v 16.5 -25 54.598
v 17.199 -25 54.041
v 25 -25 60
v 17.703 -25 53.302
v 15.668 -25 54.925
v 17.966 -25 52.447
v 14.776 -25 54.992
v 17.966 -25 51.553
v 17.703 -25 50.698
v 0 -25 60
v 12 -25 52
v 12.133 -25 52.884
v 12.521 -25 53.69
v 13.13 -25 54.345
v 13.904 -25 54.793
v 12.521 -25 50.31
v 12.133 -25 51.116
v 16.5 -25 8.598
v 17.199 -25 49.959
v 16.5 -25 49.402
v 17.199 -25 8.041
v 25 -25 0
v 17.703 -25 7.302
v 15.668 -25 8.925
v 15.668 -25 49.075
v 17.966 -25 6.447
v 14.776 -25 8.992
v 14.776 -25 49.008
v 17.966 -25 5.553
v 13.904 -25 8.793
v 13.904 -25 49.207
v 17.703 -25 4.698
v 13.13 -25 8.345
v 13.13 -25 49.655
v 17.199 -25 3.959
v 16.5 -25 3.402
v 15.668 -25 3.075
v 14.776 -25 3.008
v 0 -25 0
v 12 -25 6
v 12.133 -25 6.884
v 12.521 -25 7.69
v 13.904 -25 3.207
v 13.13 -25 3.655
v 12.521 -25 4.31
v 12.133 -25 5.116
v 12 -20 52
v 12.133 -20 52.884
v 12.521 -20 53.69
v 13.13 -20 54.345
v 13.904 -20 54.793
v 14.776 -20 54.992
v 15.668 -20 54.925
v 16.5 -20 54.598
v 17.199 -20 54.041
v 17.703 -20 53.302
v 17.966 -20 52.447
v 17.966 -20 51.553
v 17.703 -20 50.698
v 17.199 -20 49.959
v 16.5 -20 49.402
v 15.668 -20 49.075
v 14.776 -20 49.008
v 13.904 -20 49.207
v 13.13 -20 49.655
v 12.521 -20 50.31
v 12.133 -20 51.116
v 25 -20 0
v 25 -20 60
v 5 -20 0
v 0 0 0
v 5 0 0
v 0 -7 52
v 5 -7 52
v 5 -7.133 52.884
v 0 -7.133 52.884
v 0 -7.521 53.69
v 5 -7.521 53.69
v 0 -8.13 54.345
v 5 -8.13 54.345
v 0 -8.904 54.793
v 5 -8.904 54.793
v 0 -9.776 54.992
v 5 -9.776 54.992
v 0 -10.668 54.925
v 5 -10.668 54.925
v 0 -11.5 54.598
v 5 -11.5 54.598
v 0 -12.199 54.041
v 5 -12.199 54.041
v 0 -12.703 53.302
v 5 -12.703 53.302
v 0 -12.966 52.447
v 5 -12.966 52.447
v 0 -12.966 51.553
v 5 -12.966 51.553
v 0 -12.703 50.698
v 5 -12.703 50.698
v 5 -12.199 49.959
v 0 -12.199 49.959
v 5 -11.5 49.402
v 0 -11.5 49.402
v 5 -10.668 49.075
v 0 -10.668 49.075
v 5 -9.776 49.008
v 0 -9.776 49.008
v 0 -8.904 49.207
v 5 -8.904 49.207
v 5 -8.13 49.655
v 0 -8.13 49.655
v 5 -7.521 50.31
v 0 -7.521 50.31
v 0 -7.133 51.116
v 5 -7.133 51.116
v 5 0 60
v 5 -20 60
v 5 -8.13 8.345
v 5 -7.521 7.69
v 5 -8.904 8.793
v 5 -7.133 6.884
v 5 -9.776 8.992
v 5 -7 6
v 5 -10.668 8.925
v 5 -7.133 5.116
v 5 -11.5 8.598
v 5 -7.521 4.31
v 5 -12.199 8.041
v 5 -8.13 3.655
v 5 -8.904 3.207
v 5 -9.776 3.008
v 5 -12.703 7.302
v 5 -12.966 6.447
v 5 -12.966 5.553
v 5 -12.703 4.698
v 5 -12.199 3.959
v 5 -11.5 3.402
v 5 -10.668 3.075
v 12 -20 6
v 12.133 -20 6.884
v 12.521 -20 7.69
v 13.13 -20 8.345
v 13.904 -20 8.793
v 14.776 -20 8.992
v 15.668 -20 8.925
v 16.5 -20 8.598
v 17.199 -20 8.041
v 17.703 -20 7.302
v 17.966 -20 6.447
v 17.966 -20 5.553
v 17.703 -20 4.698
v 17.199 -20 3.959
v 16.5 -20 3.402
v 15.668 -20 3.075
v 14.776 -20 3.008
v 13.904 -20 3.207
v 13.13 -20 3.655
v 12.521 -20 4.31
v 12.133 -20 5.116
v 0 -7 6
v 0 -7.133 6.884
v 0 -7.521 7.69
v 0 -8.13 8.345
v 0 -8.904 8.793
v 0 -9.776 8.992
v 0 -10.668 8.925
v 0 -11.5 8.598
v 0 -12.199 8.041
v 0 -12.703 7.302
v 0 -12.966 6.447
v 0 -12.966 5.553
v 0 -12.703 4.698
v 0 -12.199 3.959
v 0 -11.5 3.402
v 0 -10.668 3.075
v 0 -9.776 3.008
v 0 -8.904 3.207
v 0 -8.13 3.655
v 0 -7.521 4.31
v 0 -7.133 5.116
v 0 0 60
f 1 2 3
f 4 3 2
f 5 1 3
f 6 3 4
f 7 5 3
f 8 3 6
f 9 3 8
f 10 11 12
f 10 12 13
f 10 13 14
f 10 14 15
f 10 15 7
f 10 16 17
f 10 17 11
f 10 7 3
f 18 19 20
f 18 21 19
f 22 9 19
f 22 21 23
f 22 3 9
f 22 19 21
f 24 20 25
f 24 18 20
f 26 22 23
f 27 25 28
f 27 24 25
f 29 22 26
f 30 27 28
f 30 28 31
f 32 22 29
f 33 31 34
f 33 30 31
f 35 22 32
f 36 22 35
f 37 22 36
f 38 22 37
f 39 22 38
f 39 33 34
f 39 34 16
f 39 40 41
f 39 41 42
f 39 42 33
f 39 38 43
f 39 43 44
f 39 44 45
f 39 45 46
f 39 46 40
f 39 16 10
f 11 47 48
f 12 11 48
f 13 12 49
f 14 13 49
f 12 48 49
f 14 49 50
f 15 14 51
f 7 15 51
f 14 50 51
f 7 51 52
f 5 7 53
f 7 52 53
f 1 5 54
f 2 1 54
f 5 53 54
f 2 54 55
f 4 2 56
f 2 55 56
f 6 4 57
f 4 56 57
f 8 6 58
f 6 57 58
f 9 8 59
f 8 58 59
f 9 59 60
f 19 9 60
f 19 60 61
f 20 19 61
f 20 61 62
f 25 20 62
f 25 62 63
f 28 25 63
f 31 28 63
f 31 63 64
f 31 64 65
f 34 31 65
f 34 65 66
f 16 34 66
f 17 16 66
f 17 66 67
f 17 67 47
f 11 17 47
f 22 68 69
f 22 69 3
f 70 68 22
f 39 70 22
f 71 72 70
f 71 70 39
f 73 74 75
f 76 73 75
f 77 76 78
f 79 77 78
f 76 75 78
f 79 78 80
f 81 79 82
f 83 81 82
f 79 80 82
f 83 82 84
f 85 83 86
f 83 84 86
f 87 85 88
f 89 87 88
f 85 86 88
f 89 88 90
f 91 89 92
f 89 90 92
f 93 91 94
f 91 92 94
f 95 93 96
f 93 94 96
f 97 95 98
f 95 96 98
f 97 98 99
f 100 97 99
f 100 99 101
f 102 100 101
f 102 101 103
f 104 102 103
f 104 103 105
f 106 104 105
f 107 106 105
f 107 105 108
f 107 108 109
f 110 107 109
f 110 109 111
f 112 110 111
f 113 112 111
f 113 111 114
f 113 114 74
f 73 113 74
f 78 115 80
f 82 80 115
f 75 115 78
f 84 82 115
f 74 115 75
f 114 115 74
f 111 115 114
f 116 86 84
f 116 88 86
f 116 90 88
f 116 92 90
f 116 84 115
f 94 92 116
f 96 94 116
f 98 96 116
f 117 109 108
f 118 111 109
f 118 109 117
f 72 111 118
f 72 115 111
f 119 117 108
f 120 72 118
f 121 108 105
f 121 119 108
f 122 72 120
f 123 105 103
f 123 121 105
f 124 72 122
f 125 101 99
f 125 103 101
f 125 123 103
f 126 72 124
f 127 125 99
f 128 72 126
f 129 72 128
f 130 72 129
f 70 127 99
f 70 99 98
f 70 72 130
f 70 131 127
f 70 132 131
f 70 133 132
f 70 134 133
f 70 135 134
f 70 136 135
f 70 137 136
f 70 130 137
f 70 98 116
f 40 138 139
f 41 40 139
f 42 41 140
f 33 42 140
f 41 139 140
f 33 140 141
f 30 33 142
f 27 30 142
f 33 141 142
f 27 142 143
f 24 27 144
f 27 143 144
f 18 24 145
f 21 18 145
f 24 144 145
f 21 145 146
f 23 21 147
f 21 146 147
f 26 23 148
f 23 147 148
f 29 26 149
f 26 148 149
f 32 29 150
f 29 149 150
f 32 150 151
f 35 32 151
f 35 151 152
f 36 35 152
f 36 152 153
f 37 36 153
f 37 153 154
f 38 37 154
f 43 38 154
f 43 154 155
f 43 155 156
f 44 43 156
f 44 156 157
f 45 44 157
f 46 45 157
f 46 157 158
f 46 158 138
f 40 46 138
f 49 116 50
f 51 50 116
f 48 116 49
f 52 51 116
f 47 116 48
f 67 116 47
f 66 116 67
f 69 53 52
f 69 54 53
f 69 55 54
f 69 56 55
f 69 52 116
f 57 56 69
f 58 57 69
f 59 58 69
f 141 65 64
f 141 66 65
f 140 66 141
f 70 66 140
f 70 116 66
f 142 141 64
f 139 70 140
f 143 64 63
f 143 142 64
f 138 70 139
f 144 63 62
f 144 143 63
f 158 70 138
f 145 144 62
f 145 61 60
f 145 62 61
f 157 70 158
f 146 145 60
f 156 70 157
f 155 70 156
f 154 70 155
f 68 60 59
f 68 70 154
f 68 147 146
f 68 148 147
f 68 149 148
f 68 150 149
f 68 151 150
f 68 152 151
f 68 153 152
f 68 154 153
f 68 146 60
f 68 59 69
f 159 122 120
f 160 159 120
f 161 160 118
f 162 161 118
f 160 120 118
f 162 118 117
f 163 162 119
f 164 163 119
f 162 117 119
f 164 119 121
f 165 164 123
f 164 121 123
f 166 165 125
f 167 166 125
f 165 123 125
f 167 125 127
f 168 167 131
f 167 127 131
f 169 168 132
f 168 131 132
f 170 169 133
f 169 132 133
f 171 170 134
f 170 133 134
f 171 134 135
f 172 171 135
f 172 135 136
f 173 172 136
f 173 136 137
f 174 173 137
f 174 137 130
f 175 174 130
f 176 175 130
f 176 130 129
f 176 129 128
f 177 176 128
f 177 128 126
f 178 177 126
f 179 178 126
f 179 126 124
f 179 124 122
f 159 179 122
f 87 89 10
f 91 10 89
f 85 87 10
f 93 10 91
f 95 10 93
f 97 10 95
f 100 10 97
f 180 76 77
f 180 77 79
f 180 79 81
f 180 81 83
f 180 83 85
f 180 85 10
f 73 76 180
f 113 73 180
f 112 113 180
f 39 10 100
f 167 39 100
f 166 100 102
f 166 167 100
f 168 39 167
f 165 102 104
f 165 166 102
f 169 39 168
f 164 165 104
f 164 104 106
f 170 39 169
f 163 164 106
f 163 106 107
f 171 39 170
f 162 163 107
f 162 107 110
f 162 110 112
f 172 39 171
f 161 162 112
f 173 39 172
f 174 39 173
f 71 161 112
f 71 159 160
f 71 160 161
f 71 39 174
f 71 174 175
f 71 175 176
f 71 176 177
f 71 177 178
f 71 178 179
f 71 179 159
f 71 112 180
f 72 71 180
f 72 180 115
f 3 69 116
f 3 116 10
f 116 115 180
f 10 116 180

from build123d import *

# Parameters (mm, degrees)
EXTRUDE_1_DEPTH     = 60
SKETCH_2_R          = 3
CUT_EXTRUDE_1_DEPTH = 69.007352544
SKETCH_3_R          = 3
CUT_EXTRUDE_2_DEPTH = 69.007352544


with BuildPart() as part:
    # 草图1 → 凸台-拉伸1 (new body)
    with BuildSketch(Plane.XY):
        Polygon((0, 0), (5, 0), (5, -20), (25, -20), (25, -25), (0, -25), align=None)
    extrude(amount=EXTRUDE_1_DEPTH)

    # 草图2 → 切除-拉伸1 (cut, through all)
    with BuildSketch(Plane(origin=(0, -20, 0), x_dir=(1, 0, 0), z_dir=(0, 1, 0))):
        with Locations(Location((15, -6, 0), (0, 0, 180))):
            Circle(SKETCH_2_R)
        with Locations(Location((15, -52, 0), (0, 0, 180))):
            Circle(SKETCH_2_R)
    extrude(amount=-CUT_EXTRUDE_1_DEPTH, mode=Mode.SUBTRACT)

    # 草图3 → 切除-拉伸2 (cut, through all)
    with BuildSketch(Plane(origin=(5, 0, 0), x_dir=(0, 0, -1), z_dir=(1, 0, 0))):
        with Locations(Location((-6, -10, 0), (0, 0, 90))):
            Circle(SKETCH_3_R)
        with Locations(Location((-52, -10, 0), (0, 0, 90))):
            Circle(SKETCH_3_R)
    extrude(amount=-CUT_EXTRUDE_2_DEPTH, mode=Mode.SUBTRACT)


solid = part.part
